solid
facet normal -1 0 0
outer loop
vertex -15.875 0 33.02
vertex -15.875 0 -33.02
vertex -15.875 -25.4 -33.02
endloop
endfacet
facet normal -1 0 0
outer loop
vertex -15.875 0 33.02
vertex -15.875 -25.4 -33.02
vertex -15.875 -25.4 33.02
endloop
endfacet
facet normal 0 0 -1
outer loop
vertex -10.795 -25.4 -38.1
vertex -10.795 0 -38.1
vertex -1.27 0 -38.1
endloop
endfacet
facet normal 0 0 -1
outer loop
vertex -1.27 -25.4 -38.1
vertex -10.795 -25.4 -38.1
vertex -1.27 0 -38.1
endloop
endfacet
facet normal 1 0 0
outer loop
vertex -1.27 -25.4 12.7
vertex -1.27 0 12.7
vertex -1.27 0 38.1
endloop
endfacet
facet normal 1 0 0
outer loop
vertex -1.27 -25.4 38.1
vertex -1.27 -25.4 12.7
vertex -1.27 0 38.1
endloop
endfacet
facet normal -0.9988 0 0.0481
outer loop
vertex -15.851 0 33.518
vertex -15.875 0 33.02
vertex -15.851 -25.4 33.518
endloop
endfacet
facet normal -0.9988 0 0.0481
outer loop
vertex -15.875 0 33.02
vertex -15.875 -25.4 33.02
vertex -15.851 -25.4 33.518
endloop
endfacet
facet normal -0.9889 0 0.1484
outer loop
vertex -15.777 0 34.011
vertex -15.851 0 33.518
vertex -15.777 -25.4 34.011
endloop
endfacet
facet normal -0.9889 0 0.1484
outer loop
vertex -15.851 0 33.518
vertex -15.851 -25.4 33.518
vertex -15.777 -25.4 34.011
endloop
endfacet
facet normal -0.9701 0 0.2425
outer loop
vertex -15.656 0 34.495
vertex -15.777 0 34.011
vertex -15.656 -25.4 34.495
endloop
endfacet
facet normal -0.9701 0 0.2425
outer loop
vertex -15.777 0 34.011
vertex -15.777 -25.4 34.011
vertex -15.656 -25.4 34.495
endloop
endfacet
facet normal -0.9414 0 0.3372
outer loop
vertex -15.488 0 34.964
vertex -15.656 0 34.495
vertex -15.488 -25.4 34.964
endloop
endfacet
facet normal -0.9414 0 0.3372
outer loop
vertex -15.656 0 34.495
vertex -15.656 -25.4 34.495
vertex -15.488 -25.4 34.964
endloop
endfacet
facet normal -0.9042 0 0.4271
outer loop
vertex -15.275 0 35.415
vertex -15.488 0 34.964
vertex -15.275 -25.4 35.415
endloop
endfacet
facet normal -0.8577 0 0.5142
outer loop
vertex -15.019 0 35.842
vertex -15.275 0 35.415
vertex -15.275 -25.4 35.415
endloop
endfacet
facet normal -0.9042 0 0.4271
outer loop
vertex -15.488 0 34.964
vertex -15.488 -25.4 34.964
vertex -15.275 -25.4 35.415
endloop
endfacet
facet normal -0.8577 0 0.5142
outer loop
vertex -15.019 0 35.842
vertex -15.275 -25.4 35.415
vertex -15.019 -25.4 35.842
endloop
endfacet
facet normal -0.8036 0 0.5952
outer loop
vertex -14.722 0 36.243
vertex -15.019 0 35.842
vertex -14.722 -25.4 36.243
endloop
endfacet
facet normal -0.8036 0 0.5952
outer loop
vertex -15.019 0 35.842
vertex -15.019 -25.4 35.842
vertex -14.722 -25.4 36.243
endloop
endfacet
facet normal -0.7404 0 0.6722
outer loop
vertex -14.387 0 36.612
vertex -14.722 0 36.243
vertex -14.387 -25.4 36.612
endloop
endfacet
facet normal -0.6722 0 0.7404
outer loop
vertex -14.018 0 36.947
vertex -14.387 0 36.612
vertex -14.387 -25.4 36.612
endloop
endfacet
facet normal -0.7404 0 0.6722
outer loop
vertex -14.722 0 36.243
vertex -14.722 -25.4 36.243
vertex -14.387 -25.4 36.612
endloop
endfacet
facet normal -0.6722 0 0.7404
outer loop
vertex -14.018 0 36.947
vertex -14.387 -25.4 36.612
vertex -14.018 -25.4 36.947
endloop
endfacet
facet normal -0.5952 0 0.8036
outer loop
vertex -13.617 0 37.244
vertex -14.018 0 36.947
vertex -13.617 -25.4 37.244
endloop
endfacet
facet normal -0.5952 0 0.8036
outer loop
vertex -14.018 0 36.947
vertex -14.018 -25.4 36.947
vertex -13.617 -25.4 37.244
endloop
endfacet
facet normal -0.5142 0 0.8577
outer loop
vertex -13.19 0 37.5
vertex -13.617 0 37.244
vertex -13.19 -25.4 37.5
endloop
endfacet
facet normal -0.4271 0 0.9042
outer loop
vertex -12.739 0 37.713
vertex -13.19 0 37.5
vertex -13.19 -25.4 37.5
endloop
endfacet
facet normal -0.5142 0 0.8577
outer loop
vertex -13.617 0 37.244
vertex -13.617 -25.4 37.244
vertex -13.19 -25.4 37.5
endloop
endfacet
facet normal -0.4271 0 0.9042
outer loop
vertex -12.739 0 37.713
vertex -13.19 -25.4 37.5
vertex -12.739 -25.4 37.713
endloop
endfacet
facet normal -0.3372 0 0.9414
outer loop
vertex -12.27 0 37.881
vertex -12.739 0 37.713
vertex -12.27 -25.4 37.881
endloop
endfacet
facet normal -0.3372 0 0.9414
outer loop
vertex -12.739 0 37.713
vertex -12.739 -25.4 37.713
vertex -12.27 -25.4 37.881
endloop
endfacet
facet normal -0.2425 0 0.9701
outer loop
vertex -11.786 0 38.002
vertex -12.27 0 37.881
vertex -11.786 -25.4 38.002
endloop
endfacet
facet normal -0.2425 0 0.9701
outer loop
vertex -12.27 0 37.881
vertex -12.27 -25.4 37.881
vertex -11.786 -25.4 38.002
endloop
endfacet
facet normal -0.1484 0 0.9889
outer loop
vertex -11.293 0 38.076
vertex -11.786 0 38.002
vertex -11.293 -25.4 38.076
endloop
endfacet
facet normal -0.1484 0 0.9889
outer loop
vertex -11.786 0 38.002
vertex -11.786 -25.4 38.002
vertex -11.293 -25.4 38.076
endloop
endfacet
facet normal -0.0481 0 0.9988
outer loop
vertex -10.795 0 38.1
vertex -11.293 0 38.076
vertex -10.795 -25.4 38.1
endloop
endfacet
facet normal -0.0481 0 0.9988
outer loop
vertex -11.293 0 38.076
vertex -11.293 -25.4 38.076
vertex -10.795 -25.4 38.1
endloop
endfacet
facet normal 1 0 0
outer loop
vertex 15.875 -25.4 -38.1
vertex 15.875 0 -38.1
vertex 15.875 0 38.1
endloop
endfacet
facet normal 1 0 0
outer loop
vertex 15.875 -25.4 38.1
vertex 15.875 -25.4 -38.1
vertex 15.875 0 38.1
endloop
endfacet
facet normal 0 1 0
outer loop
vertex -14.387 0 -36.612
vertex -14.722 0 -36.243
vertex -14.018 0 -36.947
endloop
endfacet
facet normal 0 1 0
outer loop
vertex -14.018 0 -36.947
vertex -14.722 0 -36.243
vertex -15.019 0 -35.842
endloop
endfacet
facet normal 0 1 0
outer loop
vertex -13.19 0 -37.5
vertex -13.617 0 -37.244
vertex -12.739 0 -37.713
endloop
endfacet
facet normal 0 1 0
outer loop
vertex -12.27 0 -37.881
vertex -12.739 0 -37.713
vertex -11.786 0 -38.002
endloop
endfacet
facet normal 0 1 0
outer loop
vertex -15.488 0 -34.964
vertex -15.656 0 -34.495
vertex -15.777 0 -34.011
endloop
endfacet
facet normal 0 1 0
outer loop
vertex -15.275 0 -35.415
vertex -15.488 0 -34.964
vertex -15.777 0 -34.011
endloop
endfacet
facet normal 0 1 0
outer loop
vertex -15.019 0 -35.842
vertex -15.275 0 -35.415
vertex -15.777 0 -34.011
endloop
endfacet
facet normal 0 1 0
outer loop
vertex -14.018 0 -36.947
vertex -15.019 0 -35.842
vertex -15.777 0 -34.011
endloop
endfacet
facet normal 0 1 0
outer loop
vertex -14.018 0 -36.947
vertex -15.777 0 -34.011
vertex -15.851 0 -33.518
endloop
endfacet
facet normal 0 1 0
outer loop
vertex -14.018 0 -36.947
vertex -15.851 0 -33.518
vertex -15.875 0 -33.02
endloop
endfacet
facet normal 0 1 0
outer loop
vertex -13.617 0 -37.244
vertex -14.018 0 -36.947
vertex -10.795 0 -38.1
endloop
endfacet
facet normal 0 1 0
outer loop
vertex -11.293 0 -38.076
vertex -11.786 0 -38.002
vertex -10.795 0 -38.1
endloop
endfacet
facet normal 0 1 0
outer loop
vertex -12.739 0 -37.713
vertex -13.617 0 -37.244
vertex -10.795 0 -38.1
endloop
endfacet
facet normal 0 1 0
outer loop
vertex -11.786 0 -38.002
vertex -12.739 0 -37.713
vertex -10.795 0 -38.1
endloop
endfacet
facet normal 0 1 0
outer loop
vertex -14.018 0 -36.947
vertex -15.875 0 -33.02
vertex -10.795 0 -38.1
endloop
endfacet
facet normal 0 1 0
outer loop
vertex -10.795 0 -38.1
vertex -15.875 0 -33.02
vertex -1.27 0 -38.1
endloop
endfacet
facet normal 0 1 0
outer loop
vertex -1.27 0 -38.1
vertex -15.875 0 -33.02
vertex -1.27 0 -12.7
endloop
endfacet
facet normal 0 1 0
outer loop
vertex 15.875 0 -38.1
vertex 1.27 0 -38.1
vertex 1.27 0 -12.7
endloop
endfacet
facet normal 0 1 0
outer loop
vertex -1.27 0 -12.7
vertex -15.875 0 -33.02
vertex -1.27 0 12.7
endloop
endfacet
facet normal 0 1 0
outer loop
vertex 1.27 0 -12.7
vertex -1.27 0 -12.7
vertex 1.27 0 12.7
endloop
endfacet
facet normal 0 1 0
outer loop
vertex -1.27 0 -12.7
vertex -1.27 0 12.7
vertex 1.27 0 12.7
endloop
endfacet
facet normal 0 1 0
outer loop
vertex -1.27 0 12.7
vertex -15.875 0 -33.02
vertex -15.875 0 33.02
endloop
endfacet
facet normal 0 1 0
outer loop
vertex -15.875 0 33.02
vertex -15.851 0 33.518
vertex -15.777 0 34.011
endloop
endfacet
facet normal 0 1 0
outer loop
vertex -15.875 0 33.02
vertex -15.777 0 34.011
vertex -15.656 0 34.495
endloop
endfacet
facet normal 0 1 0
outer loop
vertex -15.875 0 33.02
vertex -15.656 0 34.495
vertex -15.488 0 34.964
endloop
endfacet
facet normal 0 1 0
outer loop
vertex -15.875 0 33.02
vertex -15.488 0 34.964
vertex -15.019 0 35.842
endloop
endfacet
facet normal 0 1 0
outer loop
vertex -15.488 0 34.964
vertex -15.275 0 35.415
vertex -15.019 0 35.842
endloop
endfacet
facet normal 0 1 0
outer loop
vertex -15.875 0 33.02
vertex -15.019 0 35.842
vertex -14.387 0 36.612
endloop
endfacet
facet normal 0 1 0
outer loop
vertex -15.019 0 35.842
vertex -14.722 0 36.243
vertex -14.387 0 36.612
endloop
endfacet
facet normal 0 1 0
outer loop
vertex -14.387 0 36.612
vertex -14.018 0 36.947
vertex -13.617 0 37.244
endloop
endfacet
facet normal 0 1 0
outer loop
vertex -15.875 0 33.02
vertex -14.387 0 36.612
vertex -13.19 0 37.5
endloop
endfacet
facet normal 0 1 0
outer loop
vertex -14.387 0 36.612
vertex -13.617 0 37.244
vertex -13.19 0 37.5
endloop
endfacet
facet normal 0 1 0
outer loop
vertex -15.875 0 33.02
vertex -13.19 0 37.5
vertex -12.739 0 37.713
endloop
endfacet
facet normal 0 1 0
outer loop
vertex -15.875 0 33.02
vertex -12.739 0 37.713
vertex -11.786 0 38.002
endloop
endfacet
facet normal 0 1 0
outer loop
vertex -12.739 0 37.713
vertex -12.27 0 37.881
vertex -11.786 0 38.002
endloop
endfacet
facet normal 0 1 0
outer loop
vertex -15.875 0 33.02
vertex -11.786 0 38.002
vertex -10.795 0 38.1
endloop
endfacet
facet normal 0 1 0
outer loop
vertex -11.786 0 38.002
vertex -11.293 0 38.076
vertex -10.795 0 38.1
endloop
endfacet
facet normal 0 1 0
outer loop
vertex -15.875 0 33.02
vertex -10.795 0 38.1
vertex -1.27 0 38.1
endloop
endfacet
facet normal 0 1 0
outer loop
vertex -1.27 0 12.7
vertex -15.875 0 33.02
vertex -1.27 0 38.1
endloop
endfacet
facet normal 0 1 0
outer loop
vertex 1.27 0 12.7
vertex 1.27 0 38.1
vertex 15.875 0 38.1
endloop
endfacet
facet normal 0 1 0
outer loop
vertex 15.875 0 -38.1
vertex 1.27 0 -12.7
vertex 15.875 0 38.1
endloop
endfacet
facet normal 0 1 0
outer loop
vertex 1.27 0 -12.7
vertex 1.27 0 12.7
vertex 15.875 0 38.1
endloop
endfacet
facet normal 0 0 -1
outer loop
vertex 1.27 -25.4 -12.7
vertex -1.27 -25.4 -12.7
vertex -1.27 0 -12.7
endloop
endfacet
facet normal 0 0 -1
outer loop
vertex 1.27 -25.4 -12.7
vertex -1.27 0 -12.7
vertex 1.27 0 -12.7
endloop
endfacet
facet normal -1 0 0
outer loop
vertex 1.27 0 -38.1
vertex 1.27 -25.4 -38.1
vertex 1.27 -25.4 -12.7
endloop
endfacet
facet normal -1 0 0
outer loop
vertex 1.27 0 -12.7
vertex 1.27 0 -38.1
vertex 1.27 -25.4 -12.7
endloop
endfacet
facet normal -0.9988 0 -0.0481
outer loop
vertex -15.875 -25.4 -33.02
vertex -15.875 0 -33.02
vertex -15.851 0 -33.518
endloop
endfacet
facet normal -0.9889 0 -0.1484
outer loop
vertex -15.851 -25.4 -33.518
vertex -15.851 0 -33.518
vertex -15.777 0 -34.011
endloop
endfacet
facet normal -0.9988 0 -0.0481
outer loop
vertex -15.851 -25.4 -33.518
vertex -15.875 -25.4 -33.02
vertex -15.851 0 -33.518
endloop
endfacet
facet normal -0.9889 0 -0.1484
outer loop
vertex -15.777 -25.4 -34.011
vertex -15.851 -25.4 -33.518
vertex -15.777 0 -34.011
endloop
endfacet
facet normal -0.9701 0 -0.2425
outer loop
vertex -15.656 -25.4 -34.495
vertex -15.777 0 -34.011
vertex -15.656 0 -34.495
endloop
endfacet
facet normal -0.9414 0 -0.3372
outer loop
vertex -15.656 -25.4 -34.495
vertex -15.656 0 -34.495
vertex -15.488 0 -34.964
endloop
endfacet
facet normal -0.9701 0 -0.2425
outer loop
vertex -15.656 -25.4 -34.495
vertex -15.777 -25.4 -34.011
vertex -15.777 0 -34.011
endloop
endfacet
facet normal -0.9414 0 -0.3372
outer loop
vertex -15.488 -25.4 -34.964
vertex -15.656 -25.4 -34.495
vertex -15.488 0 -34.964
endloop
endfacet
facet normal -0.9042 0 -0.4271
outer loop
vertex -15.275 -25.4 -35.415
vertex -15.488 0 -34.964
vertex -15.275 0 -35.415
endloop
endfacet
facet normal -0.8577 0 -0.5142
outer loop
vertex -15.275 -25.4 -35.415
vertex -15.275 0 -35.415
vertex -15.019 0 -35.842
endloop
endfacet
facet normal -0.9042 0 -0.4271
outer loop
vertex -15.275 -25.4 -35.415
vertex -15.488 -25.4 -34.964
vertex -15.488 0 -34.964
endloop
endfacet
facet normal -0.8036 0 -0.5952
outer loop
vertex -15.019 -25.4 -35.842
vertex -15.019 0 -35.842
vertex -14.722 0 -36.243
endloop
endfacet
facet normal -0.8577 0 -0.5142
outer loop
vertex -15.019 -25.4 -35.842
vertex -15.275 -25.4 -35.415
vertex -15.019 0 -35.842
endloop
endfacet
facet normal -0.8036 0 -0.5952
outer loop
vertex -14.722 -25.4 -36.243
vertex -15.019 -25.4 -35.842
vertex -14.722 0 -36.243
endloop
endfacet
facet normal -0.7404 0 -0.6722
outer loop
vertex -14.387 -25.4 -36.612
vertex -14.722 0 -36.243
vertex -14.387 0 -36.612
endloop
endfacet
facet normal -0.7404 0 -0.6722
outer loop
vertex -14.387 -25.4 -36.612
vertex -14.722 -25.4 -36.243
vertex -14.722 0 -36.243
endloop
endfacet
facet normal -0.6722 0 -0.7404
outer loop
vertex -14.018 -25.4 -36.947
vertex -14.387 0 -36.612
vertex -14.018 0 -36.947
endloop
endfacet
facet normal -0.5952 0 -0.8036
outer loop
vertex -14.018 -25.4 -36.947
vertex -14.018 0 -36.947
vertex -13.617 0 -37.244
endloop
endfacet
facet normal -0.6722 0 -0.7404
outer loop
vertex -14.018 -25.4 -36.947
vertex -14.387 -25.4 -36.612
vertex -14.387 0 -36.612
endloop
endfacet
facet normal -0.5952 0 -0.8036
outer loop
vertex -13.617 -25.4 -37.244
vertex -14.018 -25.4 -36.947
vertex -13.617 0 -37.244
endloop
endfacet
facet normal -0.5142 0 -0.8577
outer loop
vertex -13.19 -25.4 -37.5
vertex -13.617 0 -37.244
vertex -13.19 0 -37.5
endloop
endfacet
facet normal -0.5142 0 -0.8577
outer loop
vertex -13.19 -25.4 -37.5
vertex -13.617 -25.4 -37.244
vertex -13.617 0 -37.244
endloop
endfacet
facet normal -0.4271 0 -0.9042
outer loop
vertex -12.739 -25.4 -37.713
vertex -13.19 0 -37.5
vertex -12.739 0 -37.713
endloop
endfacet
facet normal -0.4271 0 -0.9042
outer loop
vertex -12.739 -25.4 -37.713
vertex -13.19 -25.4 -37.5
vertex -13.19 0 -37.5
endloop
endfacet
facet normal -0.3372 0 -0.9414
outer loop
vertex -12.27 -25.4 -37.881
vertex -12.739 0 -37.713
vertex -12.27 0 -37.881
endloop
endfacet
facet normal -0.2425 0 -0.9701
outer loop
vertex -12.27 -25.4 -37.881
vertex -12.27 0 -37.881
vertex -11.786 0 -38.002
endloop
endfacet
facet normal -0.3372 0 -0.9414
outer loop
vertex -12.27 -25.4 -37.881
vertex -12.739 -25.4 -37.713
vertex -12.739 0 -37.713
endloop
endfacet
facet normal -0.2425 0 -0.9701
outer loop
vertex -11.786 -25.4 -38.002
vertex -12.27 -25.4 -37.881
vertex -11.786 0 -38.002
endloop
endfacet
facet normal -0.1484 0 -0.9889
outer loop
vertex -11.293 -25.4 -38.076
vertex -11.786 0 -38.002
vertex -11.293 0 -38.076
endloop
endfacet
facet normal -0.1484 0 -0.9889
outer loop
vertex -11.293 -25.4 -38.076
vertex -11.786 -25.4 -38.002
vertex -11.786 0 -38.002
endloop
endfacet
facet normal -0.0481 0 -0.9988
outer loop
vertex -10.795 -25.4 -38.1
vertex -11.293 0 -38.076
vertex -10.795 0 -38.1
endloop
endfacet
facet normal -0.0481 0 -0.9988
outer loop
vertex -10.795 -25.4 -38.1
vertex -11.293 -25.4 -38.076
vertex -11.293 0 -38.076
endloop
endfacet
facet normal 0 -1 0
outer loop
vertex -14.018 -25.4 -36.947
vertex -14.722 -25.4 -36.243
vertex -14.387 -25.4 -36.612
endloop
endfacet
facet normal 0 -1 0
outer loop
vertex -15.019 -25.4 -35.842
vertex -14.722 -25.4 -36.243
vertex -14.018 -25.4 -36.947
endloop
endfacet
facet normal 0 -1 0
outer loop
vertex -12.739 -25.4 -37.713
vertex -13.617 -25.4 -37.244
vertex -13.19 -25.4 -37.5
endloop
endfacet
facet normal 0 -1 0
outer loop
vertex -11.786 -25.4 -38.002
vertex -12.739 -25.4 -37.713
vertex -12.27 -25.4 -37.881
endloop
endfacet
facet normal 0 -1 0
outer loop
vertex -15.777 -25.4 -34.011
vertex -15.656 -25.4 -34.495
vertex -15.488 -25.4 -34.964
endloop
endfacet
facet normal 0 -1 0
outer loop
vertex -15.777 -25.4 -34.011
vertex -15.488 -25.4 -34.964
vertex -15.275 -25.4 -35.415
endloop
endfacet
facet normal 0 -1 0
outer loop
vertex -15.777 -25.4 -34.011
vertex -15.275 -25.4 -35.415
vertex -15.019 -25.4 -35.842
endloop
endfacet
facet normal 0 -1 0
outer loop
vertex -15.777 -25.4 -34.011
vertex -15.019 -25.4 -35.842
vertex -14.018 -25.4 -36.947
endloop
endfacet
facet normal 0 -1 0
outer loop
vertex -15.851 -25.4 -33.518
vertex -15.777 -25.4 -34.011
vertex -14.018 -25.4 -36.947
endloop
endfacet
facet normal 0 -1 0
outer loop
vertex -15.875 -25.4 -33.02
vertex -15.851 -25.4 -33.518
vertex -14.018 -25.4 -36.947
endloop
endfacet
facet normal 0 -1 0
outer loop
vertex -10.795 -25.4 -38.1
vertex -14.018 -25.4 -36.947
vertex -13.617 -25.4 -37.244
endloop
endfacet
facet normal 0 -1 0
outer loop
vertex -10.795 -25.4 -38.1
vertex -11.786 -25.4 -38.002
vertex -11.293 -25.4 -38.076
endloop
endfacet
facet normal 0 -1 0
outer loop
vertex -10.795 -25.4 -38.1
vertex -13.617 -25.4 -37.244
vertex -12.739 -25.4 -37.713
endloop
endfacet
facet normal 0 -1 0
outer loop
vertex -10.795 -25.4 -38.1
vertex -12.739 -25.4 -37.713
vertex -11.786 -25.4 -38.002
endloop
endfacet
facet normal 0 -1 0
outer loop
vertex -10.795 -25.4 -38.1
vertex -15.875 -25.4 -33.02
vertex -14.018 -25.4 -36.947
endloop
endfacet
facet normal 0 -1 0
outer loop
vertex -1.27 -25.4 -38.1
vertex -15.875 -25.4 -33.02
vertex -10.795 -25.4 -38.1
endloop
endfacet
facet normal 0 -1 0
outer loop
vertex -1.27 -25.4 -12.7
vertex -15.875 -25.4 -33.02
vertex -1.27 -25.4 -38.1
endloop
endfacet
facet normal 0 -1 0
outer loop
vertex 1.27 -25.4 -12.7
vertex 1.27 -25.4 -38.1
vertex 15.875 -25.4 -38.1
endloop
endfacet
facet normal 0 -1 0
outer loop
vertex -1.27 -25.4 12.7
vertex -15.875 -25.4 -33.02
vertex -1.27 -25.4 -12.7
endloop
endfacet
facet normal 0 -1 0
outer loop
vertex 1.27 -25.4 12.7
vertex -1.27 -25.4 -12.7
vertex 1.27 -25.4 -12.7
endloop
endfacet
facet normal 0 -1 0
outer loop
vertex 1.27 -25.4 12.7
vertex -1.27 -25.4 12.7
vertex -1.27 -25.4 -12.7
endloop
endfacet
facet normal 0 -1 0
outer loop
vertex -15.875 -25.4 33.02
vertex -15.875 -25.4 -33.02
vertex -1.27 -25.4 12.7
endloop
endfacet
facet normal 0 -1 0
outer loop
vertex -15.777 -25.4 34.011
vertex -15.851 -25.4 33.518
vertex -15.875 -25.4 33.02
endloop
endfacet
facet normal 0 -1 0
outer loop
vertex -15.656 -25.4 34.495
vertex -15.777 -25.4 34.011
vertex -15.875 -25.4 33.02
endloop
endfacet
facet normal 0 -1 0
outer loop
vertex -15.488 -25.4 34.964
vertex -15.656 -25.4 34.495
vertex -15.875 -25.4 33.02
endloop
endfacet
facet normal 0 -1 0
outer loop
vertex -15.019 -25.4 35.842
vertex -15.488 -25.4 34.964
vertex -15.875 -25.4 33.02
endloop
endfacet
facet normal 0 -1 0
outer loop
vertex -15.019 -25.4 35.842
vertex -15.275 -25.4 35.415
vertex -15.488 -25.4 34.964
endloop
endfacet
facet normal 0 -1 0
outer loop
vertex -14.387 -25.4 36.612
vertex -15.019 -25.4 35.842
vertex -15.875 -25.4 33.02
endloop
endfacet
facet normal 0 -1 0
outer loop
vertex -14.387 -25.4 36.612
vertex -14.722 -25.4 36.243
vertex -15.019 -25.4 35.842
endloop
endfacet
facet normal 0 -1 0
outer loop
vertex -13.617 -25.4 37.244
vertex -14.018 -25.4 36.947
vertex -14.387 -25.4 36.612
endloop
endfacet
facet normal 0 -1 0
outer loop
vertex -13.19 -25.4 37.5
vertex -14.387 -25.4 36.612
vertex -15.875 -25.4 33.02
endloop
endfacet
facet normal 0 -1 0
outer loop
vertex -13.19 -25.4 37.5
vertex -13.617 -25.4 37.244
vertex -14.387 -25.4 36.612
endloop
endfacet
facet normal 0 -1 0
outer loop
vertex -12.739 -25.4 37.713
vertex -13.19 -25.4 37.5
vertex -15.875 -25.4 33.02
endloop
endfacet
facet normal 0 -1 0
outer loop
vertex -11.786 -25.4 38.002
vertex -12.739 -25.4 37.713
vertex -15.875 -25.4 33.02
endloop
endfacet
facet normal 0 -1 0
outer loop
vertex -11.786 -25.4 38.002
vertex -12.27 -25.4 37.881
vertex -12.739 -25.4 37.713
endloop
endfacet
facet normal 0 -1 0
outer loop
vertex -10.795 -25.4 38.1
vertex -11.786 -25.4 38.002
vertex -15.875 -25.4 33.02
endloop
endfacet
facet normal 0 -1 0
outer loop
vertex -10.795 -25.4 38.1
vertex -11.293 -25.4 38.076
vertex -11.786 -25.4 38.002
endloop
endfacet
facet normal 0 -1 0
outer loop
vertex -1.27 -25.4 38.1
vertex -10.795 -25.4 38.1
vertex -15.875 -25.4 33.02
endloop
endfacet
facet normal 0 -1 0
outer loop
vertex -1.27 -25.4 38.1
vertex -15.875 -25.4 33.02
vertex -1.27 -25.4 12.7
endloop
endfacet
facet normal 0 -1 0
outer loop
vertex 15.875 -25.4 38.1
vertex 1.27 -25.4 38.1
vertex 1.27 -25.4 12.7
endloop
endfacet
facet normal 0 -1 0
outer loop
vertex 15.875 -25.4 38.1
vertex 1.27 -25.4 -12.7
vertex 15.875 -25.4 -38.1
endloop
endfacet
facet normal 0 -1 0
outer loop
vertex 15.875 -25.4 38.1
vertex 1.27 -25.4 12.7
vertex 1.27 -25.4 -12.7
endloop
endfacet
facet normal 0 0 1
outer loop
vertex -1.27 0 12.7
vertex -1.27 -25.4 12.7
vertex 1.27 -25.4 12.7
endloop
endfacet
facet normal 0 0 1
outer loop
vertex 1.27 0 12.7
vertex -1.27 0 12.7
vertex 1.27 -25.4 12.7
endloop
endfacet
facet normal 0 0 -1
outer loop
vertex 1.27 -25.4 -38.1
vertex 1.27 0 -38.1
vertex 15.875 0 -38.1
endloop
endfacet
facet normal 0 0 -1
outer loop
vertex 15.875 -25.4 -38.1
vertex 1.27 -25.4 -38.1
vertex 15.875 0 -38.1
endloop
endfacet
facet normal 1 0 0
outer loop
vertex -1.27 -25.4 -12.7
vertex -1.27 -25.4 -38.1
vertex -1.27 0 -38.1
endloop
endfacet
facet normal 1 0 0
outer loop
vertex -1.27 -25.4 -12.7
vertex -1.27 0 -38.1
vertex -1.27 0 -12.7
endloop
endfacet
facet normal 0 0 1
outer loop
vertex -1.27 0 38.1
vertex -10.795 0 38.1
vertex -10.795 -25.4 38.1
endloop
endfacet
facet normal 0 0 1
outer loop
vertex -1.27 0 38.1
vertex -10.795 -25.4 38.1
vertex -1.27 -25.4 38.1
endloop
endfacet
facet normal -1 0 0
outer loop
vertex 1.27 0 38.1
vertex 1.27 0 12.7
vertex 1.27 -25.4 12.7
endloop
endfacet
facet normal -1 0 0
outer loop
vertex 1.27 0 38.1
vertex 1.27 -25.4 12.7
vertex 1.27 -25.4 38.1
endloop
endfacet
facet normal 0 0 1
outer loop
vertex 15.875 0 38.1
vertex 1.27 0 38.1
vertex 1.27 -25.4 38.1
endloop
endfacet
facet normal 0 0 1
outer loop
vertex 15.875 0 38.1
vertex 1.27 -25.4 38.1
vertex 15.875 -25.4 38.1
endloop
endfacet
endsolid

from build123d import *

# Parameters (mm, degrees)
F0_W     = 31.75
F0_H     = 76.2
F1_DEPTH = 25.4
F2_W     = 2.54
F2_H     = 25.4
F3_DEPTH = 25.4
F4_R     = 5.08


with BuildPart() as f1:
    # F0 (on Front) → F1 (new body)
    with BuildSketch(Plane.XZ):
        Rectangle(F0_W, F0_H)
    extrude(amount=F1_DEPTH)

    # F2 (on face) → F3 (cut)
    with BuildSketch(Plane.XZ.offset(25.4)):
        with Locations((0, 25.4)):
            Rectangle(F2_W, F2_H)
        with Locations((0, -25.4)):
            Rectangle(F2_W, F2_H)
    extrude(amount=-F3_DEPTH, mode=Mode.SUBTRACT)

    # F4
    f4_edges = [f1.edges().sort_by_distance(p)[0] for p in [
        (-15.875, -12.7, 38.1),
        (-15.875, -12.7, -38.1),
    ]]
    fillet(f4_edges, radius=F4_R)


solid = f1.part
